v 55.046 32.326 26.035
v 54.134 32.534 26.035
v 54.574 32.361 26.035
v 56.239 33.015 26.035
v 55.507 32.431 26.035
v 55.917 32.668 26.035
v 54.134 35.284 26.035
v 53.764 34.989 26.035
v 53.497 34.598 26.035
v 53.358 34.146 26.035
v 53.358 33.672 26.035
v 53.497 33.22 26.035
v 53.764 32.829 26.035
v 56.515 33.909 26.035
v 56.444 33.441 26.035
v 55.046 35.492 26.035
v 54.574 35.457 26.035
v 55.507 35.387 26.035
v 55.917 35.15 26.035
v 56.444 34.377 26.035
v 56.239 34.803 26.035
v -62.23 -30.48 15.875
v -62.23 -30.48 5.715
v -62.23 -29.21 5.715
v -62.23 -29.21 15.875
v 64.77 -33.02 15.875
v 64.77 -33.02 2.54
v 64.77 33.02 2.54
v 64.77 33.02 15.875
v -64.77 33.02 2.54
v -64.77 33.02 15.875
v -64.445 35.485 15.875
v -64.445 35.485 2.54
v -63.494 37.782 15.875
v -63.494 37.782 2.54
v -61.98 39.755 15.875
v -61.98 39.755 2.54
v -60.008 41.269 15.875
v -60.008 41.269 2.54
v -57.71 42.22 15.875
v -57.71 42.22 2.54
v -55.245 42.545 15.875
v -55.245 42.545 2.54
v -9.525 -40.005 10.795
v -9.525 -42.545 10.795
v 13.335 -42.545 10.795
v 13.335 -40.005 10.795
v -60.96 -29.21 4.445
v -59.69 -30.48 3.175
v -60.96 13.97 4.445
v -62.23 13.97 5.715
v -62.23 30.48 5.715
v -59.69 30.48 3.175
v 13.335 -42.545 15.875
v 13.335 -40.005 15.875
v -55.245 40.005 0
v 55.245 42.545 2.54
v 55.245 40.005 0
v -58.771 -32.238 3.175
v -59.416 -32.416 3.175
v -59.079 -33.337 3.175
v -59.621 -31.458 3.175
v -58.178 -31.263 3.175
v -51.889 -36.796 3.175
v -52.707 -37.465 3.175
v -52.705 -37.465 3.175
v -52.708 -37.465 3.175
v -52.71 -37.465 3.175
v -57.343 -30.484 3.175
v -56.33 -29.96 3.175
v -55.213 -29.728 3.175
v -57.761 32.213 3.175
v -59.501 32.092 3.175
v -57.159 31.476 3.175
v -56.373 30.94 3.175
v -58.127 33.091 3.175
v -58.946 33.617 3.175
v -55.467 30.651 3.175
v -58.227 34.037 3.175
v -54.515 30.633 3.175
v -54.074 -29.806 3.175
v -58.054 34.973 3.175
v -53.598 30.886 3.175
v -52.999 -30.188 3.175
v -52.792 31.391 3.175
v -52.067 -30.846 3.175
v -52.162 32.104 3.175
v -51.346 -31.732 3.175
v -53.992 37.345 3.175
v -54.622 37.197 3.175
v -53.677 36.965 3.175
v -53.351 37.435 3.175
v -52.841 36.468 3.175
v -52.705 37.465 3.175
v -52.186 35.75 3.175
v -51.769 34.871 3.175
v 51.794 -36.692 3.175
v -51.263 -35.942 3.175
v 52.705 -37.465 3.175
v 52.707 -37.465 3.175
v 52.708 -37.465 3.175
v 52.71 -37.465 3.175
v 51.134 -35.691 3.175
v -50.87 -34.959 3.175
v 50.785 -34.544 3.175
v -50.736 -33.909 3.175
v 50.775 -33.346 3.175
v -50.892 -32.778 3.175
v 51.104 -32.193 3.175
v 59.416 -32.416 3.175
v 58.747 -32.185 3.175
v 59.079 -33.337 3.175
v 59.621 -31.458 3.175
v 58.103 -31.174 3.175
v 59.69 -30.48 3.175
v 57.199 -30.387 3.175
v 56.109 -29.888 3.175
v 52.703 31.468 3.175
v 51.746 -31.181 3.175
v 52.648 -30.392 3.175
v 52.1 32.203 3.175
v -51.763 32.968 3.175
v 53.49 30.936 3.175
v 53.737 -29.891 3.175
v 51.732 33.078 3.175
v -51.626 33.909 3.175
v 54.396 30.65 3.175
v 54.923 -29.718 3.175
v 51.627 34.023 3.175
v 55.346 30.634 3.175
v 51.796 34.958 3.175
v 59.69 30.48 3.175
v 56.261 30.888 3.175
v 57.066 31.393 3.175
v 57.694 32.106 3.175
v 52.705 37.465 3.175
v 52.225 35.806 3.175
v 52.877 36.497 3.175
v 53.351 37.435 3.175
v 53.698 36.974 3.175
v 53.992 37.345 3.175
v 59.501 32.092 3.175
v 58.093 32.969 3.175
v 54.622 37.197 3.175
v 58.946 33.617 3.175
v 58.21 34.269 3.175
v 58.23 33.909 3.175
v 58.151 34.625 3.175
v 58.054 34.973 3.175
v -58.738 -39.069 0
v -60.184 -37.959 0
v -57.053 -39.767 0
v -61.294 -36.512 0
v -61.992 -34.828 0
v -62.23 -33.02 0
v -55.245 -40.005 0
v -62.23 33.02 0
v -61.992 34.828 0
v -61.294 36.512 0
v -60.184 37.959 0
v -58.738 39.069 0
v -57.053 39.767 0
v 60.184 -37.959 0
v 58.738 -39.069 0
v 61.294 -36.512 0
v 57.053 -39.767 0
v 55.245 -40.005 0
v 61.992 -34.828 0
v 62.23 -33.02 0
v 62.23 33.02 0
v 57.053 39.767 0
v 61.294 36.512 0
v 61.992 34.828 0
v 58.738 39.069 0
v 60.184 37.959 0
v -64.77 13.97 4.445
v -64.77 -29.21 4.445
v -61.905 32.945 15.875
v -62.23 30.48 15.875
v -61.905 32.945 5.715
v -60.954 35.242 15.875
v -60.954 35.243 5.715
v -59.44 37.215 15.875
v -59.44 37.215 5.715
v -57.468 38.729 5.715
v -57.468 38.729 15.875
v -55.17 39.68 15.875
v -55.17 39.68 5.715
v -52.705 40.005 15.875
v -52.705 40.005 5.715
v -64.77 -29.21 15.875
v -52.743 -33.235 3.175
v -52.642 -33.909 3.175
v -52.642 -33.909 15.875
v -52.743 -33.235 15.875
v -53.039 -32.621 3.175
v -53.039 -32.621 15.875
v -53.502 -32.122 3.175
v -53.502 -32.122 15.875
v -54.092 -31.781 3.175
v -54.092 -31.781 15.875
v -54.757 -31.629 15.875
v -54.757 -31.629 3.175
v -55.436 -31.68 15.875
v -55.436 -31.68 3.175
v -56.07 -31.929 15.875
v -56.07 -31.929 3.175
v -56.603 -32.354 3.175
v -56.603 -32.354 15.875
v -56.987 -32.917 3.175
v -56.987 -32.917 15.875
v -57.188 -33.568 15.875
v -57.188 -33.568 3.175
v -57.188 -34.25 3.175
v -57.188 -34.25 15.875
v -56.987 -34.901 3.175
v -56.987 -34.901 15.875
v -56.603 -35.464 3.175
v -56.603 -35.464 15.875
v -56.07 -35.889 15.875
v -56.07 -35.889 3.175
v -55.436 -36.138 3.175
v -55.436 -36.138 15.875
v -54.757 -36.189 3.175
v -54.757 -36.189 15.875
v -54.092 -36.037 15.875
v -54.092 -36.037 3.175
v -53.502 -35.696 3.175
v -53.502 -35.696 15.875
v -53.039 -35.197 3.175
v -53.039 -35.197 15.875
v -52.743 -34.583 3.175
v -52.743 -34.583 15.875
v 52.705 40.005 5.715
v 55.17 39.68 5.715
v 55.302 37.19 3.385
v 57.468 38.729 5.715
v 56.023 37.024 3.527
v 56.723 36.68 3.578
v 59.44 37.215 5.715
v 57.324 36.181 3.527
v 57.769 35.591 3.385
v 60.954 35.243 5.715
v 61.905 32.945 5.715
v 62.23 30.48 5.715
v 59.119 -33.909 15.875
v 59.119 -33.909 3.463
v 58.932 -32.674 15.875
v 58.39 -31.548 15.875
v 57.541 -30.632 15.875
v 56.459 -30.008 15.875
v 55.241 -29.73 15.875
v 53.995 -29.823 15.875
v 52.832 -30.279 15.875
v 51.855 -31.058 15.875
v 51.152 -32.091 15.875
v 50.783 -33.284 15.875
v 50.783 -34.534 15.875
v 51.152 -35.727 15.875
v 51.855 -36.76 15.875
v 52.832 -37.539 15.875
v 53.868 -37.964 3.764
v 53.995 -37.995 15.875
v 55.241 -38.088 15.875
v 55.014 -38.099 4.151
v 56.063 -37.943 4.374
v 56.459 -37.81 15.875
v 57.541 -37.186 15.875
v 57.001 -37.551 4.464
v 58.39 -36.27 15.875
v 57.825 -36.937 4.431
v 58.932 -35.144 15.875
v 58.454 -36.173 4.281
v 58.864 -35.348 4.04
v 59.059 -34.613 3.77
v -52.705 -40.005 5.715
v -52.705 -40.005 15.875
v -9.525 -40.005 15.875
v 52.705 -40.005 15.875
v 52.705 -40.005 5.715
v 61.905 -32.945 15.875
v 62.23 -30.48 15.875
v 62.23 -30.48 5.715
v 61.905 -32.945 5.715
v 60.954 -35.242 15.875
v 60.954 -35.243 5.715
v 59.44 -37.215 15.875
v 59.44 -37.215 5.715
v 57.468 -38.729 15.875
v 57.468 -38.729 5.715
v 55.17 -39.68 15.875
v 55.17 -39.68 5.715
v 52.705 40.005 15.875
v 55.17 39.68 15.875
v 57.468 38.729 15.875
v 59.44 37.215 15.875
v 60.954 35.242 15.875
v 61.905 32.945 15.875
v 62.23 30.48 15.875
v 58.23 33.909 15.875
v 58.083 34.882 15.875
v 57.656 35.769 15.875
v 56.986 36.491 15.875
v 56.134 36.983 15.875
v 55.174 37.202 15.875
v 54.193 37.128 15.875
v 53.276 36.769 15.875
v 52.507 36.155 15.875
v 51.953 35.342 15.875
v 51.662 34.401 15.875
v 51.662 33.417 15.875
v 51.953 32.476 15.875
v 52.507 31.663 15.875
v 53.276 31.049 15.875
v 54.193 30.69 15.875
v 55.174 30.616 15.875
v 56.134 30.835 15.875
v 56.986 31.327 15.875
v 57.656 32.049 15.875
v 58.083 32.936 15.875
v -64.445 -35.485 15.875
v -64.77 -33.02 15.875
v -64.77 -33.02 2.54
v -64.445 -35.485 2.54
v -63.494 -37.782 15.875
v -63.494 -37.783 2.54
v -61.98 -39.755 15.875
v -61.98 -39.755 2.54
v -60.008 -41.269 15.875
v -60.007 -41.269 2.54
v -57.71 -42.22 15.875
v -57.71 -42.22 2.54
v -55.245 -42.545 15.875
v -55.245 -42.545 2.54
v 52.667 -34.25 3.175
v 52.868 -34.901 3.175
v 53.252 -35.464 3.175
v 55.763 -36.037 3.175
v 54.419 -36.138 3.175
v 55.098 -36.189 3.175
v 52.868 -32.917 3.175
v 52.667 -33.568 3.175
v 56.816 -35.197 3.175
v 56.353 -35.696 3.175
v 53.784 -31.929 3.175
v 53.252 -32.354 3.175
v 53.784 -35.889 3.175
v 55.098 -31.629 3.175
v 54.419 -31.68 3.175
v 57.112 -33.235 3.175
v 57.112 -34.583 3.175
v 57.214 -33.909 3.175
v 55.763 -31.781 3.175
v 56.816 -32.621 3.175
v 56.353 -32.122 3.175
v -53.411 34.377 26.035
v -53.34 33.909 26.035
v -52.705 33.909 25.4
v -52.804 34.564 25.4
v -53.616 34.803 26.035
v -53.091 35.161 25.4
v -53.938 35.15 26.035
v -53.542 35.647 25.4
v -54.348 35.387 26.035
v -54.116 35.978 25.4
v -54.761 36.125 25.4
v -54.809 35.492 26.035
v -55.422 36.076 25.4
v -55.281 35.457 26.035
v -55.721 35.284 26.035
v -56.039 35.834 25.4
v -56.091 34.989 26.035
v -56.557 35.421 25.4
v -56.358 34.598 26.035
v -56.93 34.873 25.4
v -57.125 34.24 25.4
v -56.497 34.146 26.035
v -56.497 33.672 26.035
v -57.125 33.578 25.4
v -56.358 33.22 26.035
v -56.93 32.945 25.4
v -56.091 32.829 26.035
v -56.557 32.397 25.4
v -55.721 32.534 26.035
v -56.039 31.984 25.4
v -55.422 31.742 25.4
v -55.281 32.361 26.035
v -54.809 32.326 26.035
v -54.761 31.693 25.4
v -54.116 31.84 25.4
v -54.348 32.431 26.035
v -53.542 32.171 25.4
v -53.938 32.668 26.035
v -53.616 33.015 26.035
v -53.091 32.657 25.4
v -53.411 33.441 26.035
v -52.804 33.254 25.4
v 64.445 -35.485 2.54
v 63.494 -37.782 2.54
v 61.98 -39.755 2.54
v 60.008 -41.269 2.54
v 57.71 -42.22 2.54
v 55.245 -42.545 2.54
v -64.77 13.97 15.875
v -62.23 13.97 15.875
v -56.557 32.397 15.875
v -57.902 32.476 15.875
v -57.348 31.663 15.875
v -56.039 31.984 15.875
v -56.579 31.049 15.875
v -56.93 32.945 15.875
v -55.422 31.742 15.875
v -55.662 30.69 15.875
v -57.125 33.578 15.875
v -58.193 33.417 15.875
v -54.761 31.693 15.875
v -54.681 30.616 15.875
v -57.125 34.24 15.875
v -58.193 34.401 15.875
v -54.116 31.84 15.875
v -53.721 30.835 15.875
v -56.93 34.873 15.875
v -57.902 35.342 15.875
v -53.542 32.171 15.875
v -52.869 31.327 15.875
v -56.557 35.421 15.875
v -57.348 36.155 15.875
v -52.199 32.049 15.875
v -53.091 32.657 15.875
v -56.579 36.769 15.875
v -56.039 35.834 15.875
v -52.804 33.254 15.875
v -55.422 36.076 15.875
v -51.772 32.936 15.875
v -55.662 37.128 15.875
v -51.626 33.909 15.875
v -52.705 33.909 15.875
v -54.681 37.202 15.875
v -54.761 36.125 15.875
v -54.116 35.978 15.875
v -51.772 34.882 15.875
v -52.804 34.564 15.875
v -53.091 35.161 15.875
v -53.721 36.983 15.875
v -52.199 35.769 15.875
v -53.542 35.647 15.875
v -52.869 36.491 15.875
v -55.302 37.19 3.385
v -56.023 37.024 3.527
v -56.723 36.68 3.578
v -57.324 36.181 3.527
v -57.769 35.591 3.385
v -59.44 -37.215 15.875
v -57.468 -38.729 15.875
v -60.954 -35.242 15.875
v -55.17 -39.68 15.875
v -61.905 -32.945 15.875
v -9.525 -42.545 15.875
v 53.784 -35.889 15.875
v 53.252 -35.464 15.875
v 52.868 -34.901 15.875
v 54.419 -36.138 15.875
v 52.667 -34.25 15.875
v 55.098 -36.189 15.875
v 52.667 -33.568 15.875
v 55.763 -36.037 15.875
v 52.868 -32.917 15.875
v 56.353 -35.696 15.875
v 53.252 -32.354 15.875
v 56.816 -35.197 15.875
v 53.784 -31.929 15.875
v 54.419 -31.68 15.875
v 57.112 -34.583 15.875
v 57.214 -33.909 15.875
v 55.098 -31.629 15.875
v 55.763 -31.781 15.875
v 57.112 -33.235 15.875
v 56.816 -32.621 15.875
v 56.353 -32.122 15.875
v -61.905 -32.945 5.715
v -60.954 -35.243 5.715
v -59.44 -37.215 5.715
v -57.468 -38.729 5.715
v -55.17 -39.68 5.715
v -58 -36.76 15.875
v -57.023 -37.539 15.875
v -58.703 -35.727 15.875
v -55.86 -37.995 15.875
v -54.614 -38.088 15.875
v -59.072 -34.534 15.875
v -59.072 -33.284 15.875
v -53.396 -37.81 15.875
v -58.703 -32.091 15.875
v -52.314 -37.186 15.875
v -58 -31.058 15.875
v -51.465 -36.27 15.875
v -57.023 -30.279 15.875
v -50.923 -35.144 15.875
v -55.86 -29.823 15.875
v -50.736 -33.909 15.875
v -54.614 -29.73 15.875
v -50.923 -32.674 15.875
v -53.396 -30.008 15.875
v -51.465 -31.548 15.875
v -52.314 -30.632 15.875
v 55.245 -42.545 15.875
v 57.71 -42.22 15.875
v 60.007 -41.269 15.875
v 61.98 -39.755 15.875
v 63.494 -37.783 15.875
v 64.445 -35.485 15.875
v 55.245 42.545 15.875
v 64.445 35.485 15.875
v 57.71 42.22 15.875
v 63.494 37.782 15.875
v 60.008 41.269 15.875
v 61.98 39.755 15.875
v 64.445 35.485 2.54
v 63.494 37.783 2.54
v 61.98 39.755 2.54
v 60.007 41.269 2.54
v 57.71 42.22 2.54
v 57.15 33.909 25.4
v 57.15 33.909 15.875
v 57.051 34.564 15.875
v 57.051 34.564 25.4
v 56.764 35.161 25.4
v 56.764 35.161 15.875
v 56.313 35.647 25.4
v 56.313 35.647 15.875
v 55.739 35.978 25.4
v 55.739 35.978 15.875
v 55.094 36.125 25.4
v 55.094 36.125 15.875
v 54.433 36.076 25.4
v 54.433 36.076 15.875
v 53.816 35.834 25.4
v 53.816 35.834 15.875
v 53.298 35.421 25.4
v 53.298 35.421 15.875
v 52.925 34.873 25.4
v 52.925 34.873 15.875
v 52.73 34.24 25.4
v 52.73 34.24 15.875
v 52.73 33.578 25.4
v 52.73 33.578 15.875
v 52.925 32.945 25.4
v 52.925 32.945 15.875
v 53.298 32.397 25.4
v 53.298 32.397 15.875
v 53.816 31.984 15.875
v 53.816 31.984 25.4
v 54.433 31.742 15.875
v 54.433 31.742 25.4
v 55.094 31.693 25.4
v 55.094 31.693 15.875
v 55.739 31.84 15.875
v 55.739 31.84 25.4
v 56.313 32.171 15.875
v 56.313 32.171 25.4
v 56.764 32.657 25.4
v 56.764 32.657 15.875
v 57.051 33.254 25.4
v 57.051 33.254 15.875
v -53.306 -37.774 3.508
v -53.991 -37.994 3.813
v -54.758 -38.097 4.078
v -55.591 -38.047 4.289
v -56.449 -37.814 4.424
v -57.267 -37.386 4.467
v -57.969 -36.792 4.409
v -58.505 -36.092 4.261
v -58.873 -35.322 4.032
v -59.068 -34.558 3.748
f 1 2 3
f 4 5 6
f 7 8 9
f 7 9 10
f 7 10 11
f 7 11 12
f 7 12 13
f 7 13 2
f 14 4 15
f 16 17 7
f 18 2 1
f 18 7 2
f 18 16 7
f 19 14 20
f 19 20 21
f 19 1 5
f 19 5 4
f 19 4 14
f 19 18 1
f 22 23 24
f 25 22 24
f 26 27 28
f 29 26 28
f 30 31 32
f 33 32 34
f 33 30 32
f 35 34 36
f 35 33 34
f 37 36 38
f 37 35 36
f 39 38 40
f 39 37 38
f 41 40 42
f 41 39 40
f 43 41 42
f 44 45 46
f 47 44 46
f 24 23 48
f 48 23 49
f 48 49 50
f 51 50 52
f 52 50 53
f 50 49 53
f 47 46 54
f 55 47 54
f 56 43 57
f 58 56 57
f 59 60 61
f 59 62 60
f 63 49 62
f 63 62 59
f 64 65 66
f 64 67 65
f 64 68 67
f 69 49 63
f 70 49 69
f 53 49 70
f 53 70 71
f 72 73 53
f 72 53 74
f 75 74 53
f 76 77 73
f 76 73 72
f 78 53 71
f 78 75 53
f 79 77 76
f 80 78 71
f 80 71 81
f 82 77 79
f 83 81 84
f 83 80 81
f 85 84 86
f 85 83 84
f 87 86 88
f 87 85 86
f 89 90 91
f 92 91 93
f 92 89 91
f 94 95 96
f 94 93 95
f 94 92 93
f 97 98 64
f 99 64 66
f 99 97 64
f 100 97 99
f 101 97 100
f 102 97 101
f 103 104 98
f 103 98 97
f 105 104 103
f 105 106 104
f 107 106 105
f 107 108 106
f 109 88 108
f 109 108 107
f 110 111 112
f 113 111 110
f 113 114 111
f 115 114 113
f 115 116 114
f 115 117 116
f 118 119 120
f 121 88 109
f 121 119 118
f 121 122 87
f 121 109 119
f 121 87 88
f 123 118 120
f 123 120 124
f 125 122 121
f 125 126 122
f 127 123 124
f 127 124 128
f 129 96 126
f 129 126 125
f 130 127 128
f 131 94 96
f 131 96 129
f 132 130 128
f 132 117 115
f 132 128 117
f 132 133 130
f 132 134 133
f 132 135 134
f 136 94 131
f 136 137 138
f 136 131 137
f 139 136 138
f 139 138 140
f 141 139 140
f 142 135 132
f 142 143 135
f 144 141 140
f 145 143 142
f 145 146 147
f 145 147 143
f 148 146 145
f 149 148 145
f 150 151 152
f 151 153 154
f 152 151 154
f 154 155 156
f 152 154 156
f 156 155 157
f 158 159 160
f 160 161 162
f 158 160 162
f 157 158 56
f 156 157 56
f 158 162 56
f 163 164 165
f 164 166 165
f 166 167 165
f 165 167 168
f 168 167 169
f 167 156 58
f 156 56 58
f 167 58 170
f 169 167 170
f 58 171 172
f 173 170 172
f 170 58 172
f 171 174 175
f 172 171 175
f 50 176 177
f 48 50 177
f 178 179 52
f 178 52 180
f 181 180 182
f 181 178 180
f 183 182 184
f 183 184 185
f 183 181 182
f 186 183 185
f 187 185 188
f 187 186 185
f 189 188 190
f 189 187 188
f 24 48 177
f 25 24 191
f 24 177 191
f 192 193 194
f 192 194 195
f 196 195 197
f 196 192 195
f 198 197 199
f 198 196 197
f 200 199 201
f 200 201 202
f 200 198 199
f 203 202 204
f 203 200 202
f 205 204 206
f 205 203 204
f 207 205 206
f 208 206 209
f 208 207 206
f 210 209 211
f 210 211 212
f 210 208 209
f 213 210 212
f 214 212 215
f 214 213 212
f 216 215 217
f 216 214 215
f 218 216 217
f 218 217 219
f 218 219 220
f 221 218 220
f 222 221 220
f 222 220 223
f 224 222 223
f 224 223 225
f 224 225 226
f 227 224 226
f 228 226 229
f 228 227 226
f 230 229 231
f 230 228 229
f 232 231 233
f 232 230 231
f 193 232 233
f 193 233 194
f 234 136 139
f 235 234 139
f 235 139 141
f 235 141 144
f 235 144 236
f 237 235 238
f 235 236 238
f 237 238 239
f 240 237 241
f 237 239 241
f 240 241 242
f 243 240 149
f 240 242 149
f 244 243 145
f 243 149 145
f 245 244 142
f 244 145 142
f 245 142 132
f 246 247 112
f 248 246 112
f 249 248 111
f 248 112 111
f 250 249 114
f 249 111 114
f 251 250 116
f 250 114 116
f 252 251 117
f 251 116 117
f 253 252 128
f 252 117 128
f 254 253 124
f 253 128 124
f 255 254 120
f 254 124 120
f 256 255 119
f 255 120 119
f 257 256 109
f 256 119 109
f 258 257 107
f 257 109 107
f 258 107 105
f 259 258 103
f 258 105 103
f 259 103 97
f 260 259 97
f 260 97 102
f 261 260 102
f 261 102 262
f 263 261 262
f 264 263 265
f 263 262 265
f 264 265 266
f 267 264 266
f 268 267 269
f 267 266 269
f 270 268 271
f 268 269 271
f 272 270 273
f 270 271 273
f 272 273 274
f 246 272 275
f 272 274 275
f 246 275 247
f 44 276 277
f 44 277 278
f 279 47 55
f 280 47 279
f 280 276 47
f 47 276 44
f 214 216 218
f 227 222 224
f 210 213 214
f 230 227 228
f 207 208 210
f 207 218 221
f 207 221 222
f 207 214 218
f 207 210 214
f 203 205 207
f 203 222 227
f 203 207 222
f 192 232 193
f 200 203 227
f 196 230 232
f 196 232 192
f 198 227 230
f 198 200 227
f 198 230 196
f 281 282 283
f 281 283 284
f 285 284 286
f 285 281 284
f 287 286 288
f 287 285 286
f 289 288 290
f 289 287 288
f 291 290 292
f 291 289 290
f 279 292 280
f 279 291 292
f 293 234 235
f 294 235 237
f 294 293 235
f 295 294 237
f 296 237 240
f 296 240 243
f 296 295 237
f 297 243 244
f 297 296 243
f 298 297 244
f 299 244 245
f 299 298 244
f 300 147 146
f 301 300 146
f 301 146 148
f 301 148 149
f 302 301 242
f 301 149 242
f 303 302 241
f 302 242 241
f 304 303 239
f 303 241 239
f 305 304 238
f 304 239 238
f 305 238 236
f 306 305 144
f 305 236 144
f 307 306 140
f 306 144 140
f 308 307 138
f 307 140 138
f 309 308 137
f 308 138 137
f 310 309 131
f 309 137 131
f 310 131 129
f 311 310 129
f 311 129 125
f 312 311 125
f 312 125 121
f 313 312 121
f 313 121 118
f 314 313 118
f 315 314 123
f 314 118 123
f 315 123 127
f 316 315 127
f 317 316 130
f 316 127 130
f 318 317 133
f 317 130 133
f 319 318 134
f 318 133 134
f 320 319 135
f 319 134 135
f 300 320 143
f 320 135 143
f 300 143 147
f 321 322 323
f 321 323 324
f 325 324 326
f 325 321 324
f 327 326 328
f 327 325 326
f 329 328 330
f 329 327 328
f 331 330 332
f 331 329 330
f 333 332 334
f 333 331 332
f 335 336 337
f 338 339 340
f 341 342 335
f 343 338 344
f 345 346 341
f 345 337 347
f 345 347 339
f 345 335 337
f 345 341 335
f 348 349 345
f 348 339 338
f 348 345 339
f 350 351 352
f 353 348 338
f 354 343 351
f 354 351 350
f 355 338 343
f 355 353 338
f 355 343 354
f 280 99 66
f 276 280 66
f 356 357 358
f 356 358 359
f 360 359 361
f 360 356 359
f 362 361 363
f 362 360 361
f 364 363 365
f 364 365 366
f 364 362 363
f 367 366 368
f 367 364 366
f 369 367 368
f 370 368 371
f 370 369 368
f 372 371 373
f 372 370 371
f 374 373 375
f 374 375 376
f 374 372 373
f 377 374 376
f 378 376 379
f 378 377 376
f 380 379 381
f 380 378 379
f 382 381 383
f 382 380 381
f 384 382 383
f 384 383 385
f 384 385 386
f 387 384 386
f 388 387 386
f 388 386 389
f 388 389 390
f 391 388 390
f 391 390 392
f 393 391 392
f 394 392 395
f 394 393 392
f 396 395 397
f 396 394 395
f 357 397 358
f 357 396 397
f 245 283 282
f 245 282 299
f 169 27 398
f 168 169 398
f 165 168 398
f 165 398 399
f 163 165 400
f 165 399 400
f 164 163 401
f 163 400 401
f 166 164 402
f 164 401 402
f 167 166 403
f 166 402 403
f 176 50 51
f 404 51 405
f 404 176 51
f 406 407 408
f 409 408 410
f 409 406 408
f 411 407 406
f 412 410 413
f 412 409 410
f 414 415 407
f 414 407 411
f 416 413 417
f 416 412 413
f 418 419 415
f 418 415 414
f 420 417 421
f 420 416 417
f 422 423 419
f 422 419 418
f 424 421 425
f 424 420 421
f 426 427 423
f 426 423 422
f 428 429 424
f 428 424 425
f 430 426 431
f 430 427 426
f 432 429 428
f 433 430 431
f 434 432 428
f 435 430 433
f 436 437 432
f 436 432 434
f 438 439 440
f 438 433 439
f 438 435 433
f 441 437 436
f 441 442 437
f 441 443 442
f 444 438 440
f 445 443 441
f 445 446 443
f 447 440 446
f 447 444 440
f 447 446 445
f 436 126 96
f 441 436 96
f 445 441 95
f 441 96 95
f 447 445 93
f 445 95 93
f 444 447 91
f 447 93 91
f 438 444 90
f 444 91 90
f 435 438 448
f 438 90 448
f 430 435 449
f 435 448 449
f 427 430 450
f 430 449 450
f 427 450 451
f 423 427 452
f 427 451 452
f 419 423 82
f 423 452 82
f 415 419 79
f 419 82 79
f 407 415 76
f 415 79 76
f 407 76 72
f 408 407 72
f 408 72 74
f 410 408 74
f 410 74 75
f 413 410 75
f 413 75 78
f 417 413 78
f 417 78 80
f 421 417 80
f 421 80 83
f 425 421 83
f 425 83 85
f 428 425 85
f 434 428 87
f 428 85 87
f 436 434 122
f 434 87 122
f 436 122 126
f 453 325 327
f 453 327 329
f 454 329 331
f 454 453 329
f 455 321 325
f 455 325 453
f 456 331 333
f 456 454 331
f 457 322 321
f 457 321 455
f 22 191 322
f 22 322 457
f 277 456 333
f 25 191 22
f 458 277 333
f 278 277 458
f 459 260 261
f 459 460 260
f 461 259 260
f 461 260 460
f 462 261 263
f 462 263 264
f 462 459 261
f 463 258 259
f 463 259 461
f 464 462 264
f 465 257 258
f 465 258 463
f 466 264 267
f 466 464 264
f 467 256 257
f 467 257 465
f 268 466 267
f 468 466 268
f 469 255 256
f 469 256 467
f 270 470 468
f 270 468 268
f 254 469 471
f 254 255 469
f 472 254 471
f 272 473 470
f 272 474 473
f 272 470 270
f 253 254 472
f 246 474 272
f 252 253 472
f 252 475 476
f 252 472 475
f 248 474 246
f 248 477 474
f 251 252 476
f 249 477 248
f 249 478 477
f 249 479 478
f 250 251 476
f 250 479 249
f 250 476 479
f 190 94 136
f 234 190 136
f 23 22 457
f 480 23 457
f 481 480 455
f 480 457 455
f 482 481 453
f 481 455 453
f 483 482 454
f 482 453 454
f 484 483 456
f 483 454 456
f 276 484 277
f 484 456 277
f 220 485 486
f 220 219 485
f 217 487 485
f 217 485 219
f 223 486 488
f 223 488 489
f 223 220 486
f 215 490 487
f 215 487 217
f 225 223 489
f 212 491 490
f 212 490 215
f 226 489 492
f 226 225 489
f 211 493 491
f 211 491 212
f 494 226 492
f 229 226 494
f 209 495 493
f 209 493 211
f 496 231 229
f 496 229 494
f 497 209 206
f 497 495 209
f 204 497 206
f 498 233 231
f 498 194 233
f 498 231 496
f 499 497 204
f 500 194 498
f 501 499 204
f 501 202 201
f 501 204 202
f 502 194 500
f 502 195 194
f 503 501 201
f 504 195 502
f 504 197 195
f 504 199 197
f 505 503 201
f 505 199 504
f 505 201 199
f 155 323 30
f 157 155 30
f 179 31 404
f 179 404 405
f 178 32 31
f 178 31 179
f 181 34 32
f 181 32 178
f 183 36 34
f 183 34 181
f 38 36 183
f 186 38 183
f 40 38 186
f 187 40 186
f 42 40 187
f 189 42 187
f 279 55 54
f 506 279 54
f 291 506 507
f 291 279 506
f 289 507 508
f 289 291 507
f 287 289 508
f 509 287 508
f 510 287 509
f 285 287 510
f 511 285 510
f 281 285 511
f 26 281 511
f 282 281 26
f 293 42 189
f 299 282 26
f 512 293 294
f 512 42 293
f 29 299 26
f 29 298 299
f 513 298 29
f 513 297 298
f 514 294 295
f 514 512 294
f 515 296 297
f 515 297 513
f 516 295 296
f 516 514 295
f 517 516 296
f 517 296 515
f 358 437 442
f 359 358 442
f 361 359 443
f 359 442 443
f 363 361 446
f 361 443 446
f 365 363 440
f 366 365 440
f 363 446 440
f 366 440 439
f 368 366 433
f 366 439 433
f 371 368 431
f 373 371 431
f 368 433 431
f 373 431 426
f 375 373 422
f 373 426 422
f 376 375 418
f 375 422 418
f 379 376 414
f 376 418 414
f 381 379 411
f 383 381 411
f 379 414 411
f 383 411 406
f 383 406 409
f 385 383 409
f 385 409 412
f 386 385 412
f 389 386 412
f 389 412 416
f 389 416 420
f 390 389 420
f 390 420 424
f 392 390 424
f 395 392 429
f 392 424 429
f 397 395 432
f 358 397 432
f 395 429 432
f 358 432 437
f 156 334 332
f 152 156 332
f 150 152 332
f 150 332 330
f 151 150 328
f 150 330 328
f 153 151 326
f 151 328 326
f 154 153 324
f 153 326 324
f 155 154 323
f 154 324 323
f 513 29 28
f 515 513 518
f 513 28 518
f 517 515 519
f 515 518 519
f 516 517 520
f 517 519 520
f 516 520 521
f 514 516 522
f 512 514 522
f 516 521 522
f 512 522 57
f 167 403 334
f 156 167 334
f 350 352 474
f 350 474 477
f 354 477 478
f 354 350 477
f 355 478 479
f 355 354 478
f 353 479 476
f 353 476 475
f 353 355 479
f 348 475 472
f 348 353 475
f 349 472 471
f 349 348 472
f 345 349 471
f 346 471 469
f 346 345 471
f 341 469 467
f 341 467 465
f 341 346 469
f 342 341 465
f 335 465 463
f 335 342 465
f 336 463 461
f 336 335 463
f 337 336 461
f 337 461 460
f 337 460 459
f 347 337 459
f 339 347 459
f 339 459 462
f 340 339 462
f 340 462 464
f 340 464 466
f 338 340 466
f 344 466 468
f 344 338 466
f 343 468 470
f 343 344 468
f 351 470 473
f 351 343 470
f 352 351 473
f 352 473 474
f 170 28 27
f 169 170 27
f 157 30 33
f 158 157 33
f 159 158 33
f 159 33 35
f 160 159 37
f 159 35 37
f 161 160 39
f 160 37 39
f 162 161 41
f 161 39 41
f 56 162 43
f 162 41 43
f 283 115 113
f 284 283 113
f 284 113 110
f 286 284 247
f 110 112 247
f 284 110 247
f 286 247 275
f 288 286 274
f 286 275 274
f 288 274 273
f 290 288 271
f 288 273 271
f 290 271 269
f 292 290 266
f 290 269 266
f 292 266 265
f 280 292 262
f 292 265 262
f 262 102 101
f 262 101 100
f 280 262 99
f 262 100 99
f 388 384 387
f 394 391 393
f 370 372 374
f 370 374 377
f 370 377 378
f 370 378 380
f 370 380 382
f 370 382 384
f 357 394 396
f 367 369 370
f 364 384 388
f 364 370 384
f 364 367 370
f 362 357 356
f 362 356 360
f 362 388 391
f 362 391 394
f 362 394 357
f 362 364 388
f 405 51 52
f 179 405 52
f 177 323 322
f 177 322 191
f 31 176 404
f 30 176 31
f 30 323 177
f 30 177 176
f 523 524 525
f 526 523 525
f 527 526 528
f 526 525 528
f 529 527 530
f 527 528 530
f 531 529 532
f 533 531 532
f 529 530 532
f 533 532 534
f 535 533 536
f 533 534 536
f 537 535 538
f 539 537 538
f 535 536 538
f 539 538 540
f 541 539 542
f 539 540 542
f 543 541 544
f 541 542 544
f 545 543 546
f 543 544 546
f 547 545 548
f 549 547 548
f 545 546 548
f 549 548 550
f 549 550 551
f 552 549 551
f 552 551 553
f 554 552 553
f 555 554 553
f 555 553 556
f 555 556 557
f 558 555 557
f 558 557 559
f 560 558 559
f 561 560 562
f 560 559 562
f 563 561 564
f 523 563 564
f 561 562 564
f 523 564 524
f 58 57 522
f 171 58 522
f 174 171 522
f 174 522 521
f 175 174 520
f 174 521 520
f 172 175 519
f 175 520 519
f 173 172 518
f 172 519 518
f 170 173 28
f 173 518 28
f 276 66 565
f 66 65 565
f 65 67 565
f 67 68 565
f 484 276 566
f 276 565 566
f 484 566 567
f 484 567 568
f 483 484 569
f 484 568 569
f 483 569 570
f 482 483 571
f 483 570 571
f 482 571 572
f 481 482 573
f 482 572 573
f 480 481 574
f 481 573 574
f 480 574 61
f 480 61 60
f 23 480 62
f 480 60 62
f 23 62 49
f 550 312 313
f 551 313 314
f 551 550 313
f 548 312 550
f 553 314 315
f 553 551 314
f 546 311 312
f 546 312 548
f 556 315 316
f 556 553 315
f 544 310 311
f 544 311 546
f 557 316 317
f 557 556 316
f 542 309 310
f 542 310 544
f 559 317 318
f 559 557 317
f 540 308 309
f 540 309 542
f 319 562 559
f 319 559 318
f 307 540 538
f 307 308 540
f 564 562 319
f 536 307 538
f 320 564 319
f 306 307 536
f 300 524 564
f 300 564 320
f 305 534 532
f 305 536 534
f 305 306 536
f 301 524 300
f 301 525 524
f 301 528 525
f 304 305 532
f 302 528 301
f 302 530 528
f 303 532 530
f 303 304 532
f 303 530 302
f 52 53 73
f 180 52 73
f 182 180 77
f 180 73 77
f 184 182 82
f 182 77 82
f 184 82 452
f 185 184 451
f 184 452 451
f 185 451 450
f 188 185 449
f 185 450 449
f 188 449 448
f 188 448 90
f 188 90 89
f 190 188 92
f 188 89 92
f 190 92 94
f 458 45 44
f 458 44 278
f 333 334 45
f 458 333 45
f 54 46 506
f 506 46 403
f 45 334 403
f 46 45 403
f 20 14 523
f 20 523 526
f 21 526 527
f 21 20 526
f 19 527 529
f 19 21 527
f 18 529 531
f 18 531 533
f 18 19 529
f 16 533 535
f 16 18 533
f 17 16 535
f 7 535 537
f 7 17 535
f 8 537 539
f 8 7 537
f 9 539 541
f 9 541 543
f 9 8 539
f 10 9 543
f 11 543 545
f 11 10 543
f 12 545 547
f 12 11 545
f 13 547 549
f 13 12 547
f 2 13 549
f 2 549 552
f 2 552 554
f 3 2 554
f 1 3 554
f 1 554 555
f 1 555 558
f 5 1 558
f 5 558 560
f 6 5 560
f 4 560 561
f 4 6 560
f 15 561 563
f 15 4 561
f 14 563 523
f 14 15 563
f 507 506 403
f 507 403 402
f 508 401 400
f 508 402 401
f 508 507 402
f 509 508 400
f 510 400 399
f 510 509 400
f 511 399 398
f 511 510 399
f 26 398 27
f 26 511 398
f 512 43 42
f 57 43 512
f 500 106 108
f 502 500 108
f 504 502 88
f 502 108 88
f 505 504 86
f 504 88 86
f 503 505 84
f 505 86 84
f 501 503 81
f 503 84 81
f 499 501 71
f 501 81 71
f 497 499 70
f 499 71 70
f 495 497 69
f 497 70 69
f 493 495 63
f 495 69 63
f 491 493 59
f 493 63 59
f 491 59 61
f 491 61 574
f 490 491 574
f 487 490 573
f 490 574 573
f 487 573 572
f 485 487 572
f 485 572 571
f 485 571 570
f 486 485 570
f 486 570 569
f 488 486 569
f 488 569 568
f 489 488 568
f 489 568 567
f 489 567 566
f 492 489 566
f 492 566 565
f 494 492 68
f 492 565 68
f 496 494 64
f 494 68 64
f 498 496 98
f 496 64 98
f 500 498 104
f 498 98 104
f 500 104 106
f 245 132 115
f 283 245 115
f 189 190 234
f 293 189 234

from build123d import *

# Parameters (mm, degrees)
F0_W      = 129.54
F0_H      = 85.09
F1_DEPTH  = 3.175
F2_W      = 129.54
F2_H      = 85.09
F2_W_2    = 124.46
F2_H_2    = 80.01
F3_DEPTH  = 12.7
F4_R      = 9.525
F5_SIZE   = 2.54
F2_R      = 4.191
F2_R_2    = 2.286
F6_DEPTH  = 12.7
F2_R_3    = 3.302
F7_DEPTH  = 12.7
F9_R      = 2.2225
F10_DEPTH = 10.16
F8_R      = 2.2225
F11_DEPTH = 10.16
F13_W     = 22.86
F13_H     = 5.08
F14_DEPTH = 2.54
F12_W     = 43.18
F12_H     = 11.43
F15_DEPTH = 3.811
F16_SIZE  = 0.635
F17_SIZE  = 0.635


with BuildPart() as f1:
    # F0 (on Top) → F1 (new body)
    with BuildSketch(Plane.XY):
        Rectangle(F0_W, F0_H)
    extrude(amount=F1_DEPTH)

    # F2 (on face) → F3 (join)
    with BuildSketch(Plane.XY.offset(3.175)):
        Rectangle(F2_W, F2_H)
        Rectangle(F2_W_2, F2_H_2, mode=Mode.SUBTRACT)
    extrude(amount=F3_DEPTH)

    # F4
    f4_edges = [f1.edges().sort_by_distance(p)[0] for p in [
        (62.23, 40.005, 9.525),
        (62.23, -40.005, 9.525),
        (-62.23, -40.005, 9.525),
        (-62.23, 40.005, 9.525),
        (64.77, 42.545, 7.9375),
        (64.77, -42.545, 7.9375),
        (-64.77, -42.545, 7.9375),
        (-64.77, 42.545, 7.9375),
    ]]
    fillet(f4_edges, radius=F4_R)

    # F5
    f5_edges = [f1.edges().sort_by_distance(p)[0] for p in [
        (0, 40.005, 3.175),
        (0, 42.545, 0),
    ]]
    chamfer(f5_edges, length=F5_SIZE)

    # F2 (on face) → F6 (join)
    with BuildSketch(Plane.XY.offset(3.175)):
        with Locations((-54.9275, -33.909)):
            Circle(F2_R)
        with Locations((-54.9275, -33.909)):
            Circle(F2_R_2, mode=Mode.SUBTRACT)
        with Locations((54.9275, -33.909)):
            Circle(F2_R)
        with Locations((54.9275, -33.909)):
            Circle(F2_R_2, mode=Mode.SUBTRACT)
    extrude(amount=F6_DEPTH)

    # F2 (on face) → F7 (join)
    with BuildSketch(Plane.XY.offset(3.175)):
        with Locations((-54.9275, 33.909)):
            Circle(F2_R_3)
        with Locations((54.9275, 33.909)):
            Circle(F2_R_3)
    extrude(amount=F7_DEPTH)

    # F9 (on face) → F10 (join)
    with BuildSketch(Plane.XY.offset(15.875)):
        with Locations((-54.9275, 33.909)):
            Circle(F9_R)
    extrude(amount=F10_DEPTH)

    # F8 (on face) → F11 (join)
    with BuildSketch(Plane.XY.offset(15.875)):
        with Locations((54.9275, 33.909)):
            Circle(F8_R)
    extrude(amount=F11_DEPTH)

    # F13 (on face) → F14 (cut, through all)
    with BuildSketch(Plane.XZ.offset(42.545)):
        with Locations((1.905, 13.335)):
            Rectangle(F13_W, F13_H)
    extrude(amount=-F14_DEPTH, mode=Mode.SUBTRACT)

    # F12 (on face) → F15 (cut, through all)
    with BuildSketch(Plane(origin=(-64.77, 0, 0), x_dir=(0, -1, 0), z_dir=(-1, 0, 0))):
        with Locations((7.62, 10.16)):
            Rectangle(F12_W, F12_H)
    extrude(amount=-F15_DEPTH, mode=Mode.SUBTRACT)

    # F16
    f16_edges = [f1.edges().sort_by_distance(p)[0] for p in [
        (-57.15, 33.909, 26.035),
    ]]
    chamfer(f16_edges, length=F16_SIZE)

    # F17
    f17_edges = [f1.edges().sort_by_distance(p)[0] for p in [
        (52.705, 33.909, 26.035),
    ]]
    chamfer(f17_edges, length=F17_SIZE)


solid = f1.part
